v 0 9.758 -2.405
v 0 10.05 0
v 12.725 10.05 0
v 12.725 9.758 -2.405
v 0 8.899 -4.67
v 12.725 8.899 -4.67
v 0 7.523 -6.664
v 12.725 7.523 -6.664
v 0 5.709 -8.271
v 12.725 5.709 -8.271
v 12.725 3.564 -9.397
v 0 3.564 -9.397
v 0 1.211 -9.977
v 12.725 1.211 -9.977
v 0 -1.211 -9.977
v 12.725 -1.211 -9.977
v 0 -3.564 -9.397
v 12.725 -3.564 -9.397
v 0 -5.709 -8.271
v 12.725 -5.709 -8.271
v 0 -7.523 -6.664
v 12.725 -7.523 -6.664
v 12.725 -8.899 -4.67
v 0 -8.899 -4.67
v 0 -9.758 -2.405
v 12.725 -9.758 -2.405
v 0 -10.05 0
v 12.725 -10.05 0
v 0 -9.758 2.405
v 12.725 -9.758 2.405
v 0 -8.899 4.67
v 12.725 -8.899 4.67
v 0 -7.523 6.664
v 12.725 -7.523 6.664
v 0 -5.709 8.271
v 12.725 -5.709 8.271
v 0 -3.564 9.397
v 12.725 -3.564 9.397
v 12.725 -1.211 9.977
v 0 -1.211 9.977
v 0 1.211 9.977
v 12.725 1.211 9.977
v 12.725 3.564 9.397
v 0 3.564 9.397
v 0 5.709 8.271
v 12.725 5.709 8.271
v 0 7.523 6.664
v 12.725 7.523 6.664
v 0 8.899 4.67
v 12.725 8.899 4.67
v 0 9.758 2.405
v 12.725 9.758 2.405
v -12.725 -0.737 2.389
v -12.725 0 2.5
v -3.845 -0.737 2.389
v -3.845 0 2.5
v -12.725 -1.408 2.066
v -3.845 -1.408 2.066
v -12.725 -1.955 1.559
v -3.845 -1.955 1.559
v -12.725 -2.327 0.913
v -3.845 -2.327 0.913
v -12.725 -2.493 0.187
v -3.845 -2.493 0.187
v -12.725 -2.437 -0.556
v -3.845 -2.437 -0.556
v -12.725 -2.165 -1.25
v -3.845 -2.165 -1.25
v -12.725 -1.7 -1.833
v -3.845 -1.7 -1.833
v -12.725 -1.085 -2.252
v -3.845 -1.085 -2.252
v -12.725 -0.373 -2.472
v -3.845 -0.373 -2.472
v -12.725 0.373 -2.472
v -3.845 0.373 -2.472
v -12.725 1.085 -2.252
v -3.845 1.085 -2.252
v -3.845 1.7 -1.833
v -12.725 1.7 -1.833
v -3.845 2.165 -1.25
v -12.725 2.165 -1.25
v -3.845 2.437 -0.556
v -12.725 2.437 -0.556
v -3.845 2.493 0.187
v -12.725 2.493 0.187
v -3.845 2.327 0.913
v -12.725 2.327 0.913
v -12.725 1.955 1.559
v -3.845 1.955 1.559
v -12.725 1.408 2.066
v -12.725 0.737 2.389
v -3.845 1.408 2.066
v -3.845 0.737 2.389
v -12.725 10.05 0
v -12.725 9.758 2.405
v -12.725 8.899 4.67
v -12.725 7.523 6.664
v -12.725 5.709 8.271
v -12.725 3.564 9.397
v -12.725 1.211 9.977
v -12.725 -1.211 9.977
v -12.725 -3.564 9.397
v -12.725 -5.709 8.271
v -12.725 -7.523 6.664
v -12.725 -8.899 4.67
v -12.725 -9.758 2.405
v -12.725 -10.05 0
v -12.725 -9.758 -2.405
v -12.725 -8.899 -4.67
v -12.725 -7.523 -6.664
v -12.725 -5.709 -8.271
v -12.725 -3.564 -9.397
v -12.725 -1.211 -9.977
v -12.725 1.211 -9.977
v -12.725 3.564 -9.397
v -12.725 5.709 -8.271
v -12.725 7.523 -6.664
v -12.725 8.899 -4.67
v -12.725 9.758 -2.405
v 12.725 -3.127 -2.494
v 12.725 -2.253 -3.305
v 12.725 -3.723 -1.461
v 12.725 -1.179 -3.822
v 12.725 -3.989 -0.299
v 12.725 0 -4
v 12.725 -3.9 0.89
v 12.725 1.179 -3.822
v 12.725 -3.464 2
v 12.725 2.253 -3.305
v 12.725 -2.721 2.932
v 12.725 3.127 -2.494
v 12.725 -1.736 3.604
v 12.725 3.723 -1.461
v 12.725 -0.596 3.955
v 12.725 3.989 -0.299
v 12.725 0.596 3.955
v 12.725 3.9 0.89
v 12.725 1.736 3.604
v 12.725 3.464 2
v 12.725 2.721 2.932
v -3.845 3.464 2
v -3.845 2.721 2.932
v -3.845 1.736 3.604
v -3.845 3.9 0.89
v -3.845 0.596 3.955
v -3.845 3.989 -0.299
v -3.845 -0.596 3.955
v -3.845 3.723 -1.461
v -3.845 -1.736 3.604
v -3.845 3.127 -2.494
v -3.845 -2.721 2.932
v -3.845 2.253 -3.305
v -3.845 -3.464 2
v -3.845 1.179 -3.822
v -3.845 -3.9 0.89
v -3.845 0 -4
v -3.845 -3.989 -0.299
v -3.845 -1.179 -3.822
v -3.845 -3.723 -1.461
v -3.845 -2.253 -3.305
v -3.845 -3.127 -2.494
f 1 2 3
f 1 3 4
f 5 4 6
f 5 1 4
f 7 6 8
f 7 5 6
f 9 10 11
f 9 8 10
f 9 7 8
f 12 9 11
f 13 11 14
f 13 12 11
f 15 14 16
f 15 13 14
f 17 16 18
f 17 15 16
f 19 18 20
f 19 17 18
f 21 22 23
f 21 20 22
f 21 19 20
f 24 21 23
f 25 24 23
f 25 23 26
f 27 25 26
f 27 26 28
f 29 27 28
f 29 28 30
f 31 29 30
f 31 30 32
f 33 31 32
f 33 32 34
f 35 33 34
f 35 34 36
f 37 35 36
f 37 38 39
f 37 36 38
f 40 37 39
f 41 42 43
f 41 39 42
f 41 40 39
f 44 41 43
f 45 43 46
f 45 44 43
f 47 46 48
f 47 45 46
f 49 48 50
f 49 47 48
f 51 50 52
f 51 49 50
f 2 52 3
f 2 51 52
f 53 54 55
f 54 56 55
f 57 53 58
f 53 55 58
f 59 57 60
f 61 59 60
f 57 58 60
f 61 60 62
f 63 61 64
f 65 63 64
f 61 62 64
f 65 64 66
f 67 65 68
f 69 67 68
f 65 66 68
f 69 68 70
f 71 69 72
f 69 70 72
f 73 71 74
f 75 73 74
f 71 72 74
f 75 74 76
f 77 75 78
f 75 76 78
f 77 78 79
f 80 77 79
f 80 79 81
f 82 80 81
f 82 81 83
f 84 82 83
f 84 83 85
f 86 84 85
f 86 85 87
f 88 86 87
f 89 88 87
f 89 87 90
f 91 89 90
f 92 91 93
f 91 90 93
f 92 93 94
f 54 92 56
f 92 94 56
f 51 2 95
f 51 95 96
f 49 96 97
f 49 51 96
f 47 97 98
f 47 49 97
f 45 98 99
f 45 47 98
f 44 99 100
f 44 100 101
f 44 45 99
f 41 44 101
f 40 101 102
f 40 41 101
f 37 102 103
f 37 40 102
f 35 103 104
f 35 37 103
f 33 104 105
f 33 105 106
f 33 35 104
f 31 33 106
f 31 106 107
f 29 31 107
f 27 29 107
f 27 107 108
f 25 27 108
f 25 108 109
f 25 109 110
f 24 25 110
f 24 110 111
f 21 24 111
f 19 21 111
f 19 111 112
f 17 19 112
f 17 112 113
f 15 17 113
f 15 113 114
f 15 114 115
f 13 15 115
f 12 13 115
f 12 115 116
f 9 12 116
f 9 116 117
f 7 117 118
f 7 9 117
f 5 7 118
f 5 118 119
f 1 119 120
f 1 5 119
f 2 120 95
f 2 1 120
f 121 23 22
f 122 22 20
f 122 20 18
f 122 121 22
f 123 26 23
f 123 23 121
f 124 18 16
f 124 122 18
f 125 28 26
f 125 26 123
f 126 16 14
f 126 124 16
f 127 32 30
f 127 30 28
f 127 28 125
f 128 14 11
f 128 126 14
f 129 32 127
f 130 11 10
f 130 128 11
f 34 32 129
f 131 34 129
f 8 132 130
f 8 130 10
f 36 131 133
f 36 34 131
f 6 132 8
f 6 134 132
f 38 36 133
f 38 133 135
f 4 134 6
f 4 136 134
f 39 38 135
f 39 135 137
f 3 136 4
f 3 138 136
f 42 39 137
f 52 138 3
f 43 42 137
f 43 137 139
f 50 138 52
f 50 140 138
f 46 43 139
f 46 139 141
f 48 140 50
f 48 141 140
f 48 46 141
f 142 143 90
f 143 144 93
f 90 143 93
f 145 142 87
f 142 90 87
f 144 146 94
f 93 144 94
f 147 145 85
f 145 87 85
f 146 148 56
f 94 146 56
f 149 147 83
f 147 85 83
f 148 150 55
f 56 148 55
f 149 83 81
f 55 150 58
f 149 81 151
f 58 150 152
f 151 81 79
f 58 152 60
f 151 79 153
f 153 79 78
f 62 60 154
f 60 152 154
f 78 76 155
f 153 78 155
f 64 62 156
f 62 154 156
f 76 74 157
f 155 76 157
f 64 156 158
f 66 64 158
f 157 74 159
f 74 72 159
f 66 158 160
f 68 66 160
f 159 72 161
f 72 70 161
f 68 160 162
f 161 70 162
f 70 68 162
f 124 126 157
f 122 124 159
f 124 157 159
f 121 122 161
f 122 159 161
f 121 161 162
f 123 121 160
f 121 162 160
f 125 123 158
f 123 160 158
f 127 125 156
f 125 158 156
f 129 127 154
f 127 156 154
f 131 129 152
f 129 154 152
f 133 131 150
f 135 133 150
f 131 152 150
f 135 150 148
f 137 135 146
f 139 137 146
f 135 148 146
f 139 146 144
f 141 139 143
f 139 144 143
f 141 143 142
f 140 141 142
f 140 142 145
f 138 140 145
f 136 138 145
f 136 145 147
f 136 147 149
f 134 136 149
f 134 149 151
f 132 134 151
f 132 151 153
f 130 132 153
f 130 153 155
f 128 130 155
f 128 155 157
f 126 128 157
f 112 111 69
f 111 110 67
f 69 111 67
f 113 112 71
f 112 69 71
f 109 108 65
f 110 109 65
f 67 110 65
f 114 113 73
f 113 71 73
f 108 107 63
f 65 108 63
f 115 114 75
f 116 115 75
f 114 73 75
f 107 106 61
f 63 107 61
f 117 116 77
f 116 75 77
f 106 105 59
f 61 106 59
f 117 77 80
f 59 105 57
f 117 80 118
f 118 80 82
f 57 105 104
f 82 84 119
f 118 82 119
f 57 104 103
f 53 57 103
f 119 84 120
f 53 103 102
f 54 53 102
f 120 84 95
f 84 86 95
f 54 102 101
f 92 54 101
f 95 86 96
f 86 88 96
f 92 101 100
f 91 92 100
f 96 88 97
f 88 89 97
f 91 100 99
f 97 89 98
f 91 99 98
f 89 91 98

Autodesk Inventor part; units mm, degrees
ref_plane "YZ Plane" through (0, 0, 0) normal (1, 0, 0) x (0, 1, 0)
ref_plane "XZ Plane" through (0, 0, 0) normal (0, 1, 0) x (-1, 0, 0)
ref_plane "XY Plane" through (0, 0, 0) normal (0, 0, 1) x (1, 0, 0)
sketch "Sketch1" plane through (0, 0, 0) normal (1, 0, 0) x (0, 1, 0)
  circle A0 centre (0, 0) radius 10.05
  dimension "d0" = 20.1
extrude "Extrusion1" add sketch "Sketch1" along normal mid plane 25.45
sketch "Sketch2" plane through (12.725, 0, 0) normal (1, 0, 0) x (0, 0, -1)
  circle A0 centre (0, 0) radius 4
  dimension "d3" = 8
hole "Hole1" at (12.725, 0, 0) direction (-1, 0, 0) diameter 8 depth 16.57
sketch "Sketch3" plane through (-12.725, 0, 0) normal (-1, 0, 0) x (0, 0, 1)
  circle A0 centre (0, 0) radius 2.5
  dimension "d11" = 5
hole "Hole2" at (-12.725, 0, 0) direction (1, 0, 0) diameter 5 end through all
properties part number "CNC-1.1v-S-1-( thread coupler)"
